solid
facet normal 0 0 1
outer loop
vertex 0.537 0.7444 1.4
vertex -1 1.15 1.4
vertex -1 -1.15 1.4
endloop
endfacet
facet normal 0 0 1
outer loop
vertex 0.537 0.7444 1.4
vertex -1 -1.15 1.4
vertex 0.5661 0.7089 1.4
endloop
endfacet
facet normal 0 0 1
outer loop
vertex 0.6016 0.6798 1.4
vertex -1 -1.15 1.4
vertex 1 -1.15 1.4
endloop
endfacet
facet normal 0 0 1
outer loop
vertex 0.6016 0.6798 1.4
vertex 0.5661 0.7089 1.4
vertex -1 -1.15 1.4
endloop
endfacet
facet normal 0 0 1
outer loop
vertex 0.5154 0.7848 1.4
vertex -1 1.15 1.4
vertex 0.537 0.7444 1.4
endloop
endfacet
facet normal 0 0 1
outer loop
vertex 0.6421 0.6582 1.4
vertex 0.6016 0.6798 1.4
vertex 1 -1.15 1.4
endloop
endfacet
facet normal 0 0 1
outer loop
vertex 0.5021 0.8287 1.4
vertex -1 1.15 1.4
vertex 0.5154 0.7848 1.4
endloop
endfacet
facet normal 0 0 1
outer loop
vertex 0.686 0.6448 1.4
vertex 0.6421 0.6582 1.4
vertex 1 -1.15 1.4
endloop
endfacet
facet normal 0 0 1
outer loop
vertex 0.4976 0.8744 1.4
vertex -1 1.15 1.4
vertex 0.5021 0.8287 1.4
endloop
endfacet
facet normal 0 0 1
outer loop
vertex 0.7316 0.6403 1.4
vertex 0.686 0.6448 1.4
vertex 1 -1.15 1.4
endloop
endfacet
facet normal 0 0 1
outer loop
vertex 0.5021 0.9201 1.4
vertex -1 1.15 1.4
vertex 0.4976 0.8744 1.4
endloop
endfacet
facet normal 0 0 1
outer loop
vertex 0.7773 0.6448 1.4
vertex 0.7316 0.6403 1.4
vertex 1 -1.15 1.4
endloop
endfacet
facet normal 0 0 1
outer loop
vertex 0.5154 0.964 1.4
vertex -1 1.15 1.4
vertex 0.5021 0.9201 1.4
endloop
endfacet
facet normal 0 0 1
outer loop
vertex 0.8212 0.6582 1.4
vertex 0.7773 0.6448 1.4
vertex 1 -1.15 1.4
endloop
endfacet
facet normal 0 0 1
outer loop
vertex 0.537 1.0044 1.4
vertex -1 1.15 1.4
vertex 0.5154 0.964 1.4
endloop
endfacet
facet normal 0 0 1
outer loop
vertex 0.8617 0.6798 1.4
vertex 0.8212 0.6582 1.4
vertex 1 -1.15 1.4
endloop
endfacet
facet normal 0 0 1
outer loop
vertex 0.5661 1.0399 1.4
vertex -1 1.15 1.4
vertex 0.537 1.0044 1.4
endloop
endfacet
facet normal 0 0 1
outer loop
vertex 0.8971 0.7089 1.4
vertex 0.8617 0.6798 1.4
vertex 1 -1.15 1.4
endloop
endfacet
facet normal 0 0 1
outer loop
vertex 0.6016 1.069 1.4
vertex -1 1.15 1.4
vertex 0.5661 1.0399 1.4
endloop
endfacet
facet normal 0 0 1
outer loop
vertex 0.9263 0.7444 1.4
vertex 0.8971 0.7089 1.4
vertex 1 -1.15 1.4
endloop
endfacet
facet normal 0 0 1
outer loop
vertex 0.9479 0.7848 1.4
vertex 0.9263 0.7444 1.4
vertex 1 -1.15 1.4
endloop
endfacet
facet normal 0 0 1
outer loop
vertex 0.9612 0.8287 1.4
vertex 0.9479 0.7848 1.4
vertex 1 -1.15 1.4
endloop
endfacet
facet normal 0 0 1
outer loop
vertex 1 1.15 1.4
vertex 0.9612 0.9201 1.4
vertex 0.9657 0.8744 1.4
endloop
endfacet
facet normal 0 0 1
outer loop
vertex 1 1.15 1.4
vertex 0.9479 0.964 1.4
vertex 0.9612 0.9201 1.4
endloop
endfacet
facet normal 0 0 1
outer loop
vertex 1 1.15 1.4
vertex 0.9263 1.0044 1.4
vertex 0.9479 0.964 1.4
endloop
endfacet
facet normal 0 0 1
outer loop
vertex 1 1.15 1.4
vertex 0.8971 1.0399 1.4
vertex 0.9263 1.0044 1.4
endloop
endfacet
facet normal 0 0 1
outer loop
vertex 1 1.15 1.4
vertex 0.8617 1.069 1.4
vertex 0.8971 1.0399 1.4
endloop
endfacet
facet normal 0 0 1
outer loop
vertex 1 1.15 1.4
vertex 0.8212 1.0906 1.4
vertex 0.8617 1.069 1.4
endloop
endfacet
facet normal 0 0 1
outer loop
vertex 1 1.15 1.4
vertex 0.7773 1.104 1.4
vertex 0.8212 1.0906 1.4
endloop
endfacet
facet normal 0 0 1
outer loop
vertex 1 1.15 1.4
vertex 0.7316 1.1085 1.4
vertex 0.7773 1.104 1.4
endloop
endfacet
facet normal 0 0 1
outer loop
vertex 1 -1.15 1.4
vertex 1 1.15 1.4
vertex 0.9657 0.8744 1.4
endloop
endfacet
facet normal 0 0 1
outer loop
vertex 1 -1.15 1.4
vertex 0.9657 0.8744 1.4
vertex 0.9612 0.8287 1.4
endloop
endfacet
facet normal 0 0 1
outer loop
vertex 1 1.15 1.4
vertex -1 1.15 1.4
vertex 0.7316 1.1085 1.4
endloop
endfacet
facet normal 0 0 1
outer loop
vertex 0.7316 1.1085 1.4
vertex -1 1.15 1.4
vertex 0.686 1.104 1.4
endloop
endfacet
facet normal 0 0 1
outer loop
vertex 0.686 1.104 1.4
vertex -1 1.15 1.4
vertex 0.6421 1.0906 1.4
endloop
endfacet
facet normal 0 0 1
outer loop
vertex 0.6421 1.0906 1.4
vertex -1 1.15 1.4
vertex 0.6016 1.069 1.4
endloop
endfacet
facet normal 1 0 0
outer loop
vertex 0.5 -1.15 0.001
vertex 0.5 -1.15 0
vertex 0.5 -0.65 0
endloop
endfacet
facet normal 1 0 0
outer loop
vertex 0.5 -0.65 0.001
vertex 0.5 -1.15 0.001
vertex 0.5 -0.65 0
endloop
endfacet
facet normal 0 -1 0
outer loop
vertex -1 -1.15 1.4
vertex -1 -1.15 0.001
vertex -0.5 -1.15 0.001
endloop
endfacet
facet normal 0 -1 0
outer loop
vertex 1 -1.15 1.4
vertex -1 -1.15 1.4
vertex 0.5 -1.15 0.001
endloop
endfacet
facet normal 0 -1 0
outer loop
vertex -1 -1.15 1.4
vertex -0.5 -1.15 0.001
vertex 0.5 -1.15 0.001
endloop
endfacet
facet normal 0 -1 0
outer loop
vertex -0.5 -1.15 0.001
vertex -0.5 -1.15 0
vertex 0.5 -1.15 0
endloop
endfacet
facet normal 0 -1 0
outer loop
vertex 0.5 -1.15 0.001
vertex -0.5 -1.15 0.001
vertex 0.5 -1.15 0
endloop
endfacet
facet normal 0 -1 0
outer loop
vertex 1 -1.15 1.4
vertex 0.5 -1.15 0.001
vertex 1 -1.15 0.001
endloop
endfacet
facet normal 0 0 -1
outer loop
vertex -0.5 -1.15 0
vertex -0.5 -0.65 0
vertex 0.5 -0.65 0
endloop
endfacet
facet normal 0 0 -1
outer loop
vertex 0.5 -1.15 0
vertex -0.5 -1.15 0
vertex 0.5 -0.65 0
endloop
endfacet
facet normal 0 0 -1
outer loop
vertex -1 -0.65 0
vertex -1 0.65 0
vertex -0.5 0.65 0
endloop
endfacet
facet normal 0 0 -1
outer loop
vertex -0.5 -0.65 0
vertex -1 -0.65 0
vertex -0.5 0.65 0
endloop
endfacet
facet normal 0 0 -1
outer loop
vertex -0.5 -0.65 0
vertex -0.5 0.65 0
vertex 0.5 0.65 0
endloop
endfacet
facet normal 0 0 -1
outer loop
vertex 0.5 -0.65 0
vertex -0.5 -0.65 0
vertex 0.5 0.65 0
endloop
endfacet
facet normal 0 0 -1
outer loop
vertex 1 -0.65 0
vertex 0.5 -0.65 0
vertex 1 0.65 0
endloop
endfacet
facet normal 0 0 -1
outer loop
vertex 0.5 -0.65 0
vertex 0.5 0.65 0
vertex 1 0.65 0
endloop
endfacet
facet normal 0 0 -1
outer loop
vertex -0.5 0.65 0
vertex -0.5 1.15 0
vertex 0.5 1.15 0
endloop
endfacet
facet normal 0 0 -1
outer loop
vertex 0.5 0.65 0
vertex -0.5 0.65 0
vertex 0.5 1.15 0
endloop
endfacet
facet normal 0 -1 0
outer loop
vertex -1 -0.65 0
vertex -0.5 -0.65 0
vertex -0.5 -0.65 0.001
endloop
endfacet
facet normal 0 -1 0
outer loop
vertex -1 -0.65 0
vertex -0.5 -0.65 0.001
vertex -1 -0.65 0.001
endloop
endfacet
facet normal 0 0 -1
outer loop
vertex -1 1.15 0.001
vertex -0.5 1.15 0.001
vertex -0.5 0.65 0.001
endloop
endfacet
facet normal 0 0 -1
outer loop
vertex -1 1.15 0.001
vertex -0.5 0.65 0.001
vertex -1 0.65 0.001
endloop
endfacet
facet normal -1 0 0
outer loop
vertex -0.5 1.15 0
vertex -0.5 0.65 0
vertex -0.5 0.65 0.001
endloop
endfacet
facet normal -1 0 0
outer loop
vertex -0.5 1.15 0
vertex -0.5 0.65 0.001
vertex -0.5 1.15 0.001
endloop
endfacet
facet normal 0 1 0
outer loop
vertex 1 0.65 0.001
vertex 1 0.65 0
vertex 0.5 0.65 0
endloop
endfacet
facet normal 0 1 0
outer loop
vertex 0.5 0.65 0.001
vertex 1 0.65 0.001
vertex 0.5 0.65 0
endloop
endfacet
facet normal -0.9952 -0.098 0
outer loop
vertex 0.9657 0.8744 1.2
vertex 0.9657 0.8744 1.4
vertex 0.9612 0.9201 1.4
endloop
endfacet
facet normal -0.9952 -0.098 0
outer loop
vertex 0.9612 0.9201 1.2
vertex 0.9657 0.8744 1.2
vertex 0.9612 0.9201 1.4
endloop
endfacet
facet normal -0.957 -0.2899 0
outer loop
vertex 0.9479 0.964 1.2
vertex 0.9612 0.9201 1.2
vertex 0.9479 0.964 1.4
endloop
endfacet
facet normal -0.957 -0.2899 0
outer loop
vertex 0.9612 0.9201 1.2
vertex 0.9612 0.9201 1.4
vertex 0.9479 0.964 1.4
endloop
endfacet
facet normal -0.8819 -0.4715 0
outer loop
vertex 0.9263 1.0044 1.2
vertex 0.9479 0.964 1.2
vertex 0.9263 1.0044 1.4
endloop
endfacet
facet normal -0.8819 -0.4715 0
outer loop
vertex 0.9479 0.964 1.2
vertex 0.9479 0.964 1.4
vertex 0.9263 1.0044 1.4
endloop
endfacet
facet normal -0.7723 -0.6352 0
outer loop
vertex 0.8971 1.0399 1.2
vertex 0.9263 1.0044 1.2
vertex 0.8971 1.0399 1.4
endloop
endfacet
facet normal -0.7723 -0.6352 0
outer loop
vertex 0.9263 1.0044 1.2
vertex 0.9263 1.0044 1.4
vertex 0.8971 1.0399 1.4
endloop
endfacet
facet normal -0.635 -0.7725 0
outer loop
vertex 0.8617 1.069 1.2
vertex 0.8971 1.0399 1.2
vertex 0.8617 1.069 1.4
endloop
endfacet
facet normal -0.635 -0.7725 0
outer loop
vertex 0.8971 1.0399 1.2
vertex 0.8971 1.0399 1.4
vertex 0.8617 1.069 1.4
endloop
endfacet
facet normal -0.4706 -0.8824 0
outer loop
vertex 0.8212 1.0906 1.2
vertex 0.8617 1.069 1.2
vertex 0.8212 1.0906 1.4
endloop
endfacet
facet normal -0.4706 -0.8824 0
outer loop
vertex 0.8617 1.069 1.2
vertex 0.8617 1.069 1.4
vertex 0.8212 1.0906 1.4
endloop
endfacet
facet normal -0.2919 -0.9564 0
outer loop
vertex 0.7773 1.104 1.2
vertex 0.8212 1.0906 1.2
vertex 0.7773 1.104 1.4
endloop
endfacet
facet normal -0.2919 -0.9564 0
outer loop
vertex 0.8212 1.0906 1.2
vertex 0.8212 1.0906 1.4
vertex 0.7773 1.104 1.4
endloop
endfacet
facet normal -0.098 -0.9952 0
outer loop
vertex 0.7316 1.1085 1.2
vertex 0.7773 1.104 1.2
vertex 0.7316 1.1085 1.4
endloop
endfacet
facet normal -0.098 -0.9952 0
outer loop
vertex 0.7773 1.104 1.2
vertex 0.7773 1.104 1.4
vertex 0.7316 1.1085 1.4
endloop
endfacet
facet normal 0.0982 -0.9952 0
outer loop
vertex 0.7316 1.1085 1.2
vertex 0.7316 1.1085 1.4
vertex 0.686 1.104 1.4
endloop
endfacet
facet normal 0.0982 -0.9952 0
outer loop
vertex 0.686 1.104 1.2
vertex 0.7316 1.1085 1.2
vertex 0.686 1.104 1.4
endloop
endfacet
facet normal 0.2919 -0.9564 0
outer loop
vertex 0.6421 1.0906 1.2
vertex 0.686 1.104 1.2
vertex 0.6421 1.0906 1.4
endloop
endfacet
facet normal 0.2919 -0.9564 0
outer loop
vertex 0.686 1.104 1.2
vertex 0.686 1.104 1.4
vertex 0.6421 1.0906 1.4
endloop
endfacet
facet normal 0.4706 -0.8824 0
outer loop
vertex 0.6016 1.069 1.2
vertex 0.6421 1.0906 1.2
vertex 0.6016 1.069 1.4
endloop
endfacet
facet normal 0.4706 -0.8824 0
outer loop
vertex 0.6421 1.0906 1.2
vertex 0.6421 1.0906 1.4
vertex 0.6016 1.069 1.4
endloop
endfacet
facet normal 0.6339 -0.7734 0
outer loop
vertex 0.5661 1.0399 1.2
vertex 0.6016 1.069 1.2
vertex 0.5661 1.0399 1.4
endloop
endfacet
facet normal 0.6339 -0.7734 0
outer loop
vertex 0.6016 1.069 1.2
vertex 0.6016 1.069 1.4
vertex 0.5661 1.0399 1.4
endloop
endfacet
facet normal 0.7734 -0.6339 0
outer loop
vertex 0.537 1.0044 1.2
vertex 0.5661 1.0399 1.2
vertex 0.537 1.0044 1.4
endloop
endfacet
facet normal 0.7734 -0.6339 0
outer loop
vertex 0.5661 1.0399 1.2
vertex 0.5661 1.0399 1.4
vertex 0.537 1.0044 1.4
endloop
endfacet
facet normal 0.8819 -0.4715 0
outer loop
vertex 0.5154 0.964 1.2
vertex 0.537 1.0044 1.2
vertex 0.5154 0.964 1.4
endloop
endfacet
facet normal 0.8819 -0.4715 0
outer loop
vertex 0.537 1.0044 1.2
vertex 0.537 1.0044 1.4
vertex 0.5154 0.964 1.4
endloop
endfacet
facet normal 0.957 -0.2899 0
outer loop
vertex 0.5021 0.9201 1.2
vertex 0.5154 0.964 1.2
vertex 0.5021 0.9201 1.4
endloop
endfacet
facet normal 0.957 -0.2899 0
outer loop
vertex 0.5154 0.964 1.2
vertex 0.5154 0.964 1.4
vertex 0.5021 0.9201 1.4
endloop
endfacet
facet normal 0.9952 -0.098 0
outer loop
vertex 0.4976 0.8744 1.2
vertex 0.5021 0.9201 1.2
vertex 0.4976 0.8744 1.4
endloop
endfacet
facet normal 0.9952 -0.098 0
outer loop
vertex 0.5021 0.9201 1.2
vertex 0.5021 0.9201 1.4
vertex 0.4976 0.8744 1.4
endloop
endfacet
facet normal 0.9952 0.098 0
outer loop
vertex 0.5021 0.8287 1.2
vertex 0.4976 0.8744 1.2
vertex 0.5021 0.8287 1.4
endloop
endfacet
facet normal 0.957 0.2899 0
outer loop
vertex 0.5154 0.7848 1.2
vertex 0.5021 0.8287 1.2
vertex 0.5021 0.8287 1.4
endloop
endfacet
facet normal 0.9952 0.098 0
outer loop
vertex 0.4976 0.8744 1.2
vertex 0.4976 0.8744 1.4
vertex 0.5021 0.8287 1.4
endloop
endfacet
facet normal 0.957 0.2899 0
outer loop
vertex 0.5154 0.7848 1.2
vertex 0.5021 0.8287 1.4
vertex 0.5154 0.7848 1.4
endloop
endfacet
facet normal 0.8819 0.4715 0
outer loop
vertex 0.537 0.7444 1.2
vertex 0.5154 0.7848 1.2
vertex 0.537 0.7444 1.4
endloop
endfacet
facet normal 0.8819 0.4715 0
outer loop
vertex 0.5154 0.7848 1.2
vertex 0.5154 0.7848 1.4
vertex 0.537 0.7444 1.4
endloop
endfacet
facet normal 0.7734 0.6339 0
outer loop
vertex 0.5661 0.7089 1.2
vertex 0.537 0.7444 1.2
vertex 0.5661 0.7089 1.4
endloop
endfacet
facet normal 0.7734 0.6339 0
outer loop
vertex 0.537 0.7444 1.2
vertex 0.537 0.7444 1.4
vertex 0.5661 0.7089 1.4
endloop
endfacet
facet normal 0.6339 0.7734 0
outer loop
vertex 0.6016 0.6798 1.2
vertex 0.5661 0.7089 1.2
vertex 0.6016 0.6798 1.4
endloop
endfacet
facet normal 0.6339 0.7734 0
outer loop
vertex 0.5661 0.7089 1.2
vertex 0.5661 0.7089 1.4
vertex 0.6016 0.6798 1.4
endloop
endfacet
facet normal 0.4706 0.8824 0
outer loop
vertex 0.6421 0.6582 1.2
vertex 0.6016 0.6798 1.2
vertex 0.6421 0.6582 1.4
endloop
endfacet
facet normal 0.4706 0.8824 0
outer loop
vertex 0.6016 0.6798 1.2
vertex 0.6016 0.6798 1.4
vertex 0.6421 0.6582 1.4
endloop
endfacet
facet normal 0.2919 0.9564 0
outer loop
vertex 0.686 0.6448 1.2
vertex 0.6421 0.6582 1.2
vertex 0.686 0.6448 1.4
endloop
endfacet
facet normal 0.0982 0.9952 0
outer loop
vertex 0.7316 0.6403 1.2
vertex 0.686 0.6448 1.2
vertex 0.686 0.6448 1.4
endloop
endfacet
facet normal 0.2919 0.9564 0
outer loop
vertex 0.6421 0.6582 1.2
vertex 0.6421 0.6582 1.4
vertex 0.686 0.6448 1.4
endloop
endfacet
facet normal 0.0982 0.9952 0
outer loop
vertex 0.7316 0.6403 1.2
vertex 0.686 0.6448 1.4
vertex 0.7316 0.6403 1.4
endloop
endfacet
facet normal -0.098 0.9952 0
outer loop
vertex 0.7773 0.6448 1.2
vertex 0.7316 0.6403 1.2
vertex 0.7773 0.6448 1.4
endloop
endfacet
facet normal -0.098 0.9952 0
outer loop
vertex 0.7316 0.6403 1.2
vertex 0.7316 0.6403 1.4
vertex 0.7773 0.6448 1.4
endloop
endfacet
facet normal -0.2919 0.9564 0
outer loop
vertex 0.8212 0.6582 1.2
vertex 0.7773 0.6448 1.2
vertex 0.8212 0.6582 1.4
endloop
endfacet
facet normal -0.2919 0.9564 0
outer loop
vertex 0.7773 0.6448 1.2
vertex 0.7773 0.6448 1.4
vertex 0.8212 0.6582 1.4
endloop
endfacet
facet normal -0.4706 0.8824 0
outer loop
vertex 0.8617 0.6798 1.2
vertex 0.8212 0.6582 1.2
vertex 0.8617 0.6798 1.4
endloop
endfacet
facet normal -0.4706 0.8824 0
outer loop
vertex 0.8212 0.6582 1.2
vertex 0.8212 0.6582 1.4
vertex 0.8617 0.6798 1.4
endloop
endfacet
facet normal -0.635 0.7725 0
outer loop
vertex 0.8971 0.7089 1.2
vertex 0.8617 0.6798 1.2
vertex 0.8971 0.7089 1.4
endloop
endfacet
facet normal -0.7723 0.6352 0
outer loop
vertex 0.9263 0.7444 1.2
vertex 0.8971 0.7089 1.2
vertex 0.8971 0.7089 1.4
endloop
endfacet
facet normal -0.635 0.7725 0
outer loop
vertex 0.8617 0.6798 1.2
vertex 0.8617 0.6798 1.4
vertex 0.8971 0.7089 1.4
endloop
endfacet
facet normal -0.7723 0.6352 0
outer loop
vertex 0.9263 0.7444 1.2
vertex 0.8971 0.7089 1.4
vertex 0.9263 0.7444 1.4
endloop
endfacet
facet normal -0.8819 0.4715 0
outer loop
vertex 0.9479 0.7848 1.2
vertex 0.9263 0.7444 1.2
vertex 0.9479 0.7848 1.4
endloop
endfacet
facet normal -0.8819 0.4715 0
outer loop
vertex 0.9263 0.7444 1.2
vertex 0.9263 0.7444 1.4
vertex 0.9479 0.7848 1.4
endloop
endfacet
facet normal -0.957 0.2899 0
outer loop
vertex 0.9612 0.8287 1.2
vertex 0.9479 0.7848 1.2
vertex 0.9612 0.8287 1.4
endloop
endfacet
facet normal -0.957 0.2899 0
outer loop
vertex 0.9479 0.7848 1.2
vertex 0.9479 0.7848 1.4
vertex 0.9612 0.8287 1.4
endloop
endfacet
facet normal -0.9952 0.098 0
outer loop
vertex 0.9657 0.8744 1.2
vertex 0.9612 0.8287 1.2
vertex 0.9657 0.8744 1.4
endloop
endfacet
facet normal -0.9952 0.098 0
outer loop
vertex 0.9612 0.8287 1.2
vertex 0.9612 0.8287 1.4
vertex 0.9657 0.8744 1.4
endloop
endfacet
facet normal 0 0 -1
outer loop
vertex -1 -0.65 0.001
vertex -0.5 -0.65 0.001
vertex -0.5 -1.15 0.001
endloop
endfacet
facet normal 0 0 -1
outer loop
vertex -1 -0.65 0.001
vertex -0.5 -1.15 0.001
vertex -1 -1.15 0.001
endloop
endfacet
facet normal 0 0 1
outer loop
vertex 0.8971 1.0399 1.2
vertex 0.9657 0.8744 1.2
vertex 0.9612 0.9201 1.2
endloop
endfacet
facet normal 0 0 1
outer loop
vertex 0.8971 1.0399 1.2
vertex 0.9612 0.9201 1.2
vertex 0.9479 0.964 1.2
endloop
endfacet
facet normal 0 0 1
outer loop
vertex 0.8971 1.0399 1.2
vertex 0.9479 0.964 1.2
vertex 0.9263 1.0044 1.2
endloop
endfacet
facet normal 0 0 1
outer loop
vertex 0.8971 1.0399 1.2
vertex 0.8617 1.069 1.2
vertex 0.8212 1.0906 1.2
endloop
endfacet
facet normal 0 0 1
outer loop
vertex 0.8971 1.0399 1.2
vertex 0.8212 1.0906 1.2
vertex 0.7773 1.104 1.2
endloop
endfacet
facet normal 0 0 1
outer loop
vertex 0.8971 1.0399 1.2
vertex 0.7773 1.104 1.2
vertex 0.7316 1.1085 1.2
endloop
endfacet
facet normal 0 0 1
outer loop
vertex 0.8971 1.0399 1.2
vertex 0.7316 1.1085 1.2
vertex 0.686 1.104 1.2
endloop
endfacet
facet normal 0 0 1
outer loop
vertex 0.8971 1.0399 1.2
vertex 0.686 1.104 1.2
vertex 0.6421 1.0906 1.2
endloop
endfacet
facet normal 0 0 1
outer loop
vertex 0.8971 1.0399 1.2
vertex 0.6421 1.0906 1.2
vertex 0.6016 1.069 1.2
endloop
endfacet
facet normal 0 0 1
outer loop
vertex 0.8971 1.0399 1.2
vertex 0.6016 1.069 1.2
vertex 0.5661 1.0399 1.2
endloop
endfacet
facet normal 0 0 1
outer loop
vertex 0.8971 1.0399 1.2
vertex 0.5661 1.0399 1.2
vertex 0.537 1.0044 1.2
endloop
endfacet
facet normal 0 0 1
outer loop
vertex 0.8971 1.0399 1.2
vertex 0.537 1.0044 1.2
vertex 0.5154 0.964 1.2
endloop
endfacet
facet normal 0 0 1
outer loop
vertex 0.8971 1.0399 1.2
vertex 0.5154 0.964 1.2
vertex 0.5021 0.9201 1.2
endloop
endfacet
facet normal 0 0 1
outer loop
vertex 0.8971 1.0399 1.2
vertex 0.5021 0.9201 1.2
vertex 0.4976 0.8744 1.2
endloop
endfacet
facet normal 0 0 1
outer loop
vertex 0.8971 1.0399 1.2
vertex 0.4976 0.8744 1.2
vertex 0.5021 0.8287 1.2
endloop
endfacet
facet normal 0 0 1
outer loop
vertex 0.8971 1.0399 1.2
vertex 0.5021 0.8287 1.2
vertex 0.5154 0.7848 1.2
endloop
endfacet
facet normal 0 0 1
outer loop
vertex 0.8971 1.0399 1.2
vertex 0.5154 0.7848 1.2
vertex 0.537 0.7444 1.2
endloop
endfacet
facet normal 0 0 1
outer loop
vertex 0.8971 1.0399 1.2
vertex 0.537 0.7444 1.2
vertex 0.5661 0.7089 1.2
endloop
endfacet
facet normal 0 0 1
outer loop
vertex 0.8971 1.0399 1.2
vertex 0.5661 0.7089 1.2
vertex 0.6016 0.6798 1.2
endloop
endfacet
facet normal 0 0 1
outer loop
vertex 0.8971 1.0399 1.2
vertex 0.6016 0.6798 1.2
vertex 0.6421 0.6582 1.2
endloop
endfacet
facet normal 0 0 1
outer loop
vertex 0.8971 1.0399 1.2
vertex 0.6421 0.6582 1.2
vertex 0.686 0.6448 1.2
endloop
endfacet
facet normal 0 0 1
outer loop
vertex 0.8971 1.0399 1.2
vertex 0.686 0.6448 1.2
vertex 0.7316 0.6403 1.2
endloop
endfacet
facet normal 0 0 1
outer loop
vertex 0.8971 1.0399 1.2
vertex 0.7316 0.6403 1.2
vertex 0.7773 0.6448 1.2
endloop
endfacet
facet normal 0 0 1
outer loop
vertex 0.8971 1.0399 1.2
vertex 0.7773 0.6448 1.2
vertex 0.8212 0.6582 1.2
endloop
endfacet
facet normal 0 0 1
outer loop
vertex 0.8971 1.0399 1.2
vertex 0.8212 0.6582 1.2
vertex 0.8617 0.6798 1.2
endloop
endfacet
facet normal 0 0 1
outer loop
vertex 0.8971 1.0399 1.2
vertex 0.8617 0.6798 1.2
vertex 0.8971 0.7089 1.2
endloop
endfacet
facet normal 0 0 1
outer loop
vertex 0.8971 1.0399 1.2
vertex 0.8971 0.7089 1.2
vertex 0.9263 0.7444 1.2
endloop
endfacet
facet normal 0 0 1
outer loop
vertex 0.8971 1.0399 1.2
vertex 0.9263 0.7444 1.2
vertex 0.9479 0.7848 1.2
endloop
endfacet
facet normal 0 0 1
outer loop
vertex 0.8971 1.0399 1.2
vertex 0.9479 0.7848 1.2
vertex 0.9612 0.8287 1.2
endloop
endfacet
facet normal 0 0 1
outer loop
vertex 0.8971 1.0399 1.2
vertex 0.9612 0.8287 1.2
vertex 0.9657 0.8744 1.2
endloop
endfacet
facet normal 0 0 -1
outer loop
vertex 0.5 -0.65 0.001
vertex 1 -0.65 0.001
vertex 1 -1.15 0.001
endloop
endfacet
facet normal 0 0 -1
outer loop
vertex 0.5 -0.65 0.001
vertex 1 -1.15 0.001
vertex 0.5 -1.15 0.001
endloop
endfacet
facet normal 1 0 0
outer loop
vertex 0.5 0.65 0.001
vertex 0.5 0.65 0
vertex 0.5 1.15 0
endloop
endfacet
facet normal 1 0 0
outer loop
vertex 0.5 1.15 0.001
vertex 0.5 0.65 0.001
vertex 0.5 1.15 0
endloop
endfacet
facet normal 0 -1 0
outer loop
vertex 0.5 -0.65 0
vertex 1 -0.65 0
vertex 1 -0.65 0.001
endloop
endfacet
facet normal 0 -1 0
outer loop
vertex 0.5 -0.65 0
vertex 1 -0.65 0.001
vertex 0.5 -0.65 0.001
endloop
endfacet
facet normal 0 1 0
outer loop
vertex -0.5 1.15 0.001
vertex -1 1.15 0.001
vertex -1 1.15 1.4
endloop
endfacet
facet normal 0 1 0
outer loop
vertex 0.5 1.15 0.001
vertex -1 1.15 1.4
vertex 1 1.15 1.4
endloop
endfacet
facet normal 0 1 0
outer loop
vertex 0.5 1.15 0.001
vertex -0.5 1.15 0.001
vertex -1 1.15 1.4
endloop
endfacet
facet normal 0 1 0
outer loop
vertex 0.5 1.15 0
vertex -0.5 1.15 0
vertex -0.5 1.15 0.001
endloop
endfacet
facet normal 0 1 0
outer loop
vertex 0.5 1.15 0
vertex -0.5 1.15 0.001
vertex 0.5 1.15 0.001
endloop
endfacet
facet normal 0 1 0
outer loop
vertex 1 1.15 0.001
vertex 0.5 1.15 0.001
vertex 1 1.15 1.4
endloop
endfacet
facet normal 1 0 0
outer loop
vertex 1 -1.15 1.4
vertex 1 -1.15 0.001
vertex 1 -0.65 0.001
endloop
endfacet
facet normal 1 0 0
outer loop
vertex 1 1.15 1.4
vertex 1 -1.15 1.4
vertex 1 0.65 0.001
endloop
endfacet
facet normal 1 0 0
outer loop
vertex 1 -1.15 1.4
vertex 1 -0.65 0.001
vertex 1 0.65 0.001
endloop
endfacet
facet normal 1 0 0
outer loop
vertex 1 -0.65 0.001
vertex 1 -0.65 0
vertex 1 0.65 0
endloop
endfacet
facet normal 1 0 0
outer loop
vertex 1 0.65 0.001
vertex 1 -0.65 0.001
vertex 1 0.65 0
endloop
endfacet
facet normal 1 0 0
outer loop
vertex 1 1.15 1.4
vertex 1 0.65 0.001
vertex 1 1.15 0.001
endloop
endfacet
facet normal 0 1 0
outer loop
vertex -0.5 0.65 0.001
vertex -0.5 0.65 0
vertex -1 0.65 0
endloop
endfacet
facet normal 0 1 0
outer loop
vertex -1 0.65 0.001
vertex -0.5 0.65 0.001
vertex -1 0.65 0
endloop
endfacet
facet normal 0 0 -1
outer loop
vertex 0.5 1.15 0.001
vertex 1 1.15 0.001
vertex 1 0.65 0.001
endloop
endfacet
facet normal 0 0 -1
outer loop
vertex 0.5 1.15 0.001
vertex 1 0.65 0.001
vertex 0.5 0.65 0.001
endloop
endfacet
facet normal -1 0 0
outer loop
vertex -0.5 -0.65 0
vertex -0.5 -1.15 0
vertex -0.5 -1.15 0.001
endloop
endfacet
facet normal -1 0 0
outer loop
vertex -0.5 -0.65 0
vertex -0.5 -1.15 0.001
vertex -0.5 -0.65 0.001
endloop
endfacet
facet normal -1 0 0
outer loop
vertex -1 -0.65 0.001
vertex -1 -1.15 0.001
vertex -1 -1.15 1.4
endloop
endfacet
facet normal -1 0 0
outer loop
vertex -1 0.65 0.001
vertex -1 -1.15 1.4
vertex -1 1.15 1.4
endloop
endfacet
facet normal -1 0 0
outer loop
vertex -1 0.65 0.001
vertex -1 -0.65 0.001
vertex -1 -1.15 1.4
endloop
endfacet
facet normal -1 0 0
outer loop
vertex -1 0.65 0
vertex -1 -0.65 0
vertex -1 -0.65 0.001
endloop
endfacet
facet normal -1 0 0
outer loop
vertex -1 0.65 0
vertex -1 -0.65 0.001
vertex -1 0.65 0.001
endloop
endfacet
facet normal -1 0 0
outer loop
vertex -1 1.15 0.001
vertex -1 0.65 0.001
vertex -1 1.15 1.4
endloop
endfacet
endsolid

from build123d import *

# Parameters (mm, degrees)
SKETCH1_W           = 2
SKETCH1_H           = 2.3
BOSS_EXTRUDE1_DEPTH = 1.4
SKETCH2_R           = 0.234052446
CUT_EXTRUDE1_DEPTH  = 0.2
SKETCH3_W           = 0.5
SKETCH3_H           = 0.5
CUT_EXTRUDE2_DEPTH  = 0.001


with BuildPart() as part:
    # Sketch1 → Boss-Extrude1 (new body)
    with BuildSketch(Plane.XY):
        Rectangle(SKETCH1_W, SKETCH1_H)
    extrude(amount=BOSS_EXTRUDE1_DEPTH)

    # Sketch2 → Cut-Extrude1 (cut)
    with BuildSketch(Plane.XY.offset(1.4)):
        with Locations((0.731649059, 0.874401574)):
            Circle(SKETCH2_R)
    extrude(amount=-CUT_EXTRUDE1_DEPTH, mode=Mode.SUBTRACT)

    # Sketch3 → Cut-Extrude2 (cut)
    with BuildSketch(Plane(origin=(0, 0, 0), x_dir=(-1, 0, 0), z_dir=(0, 0, -1))):
        with Locations((-0.75, 0.9)):
            Rectangle(SKETCH3_W, SKETCH3_H)
        with Locations((0.75, 0.9)):
            Rectangle(SKETCH3_W, SKETCH3_H)
        with Locations((-0.75, -0.9)):
            Rectangle(SKETCH3_W, SKETCH3_H)
        with Locations((0.75, -0.9)):
            Rectangle(SKETCH3_W, SKETCH3_H)
    extrude(amount=-CUT_EXTRUDE2_DEPTH, mode=Mode.SUBTRACT)


solid = part.part
